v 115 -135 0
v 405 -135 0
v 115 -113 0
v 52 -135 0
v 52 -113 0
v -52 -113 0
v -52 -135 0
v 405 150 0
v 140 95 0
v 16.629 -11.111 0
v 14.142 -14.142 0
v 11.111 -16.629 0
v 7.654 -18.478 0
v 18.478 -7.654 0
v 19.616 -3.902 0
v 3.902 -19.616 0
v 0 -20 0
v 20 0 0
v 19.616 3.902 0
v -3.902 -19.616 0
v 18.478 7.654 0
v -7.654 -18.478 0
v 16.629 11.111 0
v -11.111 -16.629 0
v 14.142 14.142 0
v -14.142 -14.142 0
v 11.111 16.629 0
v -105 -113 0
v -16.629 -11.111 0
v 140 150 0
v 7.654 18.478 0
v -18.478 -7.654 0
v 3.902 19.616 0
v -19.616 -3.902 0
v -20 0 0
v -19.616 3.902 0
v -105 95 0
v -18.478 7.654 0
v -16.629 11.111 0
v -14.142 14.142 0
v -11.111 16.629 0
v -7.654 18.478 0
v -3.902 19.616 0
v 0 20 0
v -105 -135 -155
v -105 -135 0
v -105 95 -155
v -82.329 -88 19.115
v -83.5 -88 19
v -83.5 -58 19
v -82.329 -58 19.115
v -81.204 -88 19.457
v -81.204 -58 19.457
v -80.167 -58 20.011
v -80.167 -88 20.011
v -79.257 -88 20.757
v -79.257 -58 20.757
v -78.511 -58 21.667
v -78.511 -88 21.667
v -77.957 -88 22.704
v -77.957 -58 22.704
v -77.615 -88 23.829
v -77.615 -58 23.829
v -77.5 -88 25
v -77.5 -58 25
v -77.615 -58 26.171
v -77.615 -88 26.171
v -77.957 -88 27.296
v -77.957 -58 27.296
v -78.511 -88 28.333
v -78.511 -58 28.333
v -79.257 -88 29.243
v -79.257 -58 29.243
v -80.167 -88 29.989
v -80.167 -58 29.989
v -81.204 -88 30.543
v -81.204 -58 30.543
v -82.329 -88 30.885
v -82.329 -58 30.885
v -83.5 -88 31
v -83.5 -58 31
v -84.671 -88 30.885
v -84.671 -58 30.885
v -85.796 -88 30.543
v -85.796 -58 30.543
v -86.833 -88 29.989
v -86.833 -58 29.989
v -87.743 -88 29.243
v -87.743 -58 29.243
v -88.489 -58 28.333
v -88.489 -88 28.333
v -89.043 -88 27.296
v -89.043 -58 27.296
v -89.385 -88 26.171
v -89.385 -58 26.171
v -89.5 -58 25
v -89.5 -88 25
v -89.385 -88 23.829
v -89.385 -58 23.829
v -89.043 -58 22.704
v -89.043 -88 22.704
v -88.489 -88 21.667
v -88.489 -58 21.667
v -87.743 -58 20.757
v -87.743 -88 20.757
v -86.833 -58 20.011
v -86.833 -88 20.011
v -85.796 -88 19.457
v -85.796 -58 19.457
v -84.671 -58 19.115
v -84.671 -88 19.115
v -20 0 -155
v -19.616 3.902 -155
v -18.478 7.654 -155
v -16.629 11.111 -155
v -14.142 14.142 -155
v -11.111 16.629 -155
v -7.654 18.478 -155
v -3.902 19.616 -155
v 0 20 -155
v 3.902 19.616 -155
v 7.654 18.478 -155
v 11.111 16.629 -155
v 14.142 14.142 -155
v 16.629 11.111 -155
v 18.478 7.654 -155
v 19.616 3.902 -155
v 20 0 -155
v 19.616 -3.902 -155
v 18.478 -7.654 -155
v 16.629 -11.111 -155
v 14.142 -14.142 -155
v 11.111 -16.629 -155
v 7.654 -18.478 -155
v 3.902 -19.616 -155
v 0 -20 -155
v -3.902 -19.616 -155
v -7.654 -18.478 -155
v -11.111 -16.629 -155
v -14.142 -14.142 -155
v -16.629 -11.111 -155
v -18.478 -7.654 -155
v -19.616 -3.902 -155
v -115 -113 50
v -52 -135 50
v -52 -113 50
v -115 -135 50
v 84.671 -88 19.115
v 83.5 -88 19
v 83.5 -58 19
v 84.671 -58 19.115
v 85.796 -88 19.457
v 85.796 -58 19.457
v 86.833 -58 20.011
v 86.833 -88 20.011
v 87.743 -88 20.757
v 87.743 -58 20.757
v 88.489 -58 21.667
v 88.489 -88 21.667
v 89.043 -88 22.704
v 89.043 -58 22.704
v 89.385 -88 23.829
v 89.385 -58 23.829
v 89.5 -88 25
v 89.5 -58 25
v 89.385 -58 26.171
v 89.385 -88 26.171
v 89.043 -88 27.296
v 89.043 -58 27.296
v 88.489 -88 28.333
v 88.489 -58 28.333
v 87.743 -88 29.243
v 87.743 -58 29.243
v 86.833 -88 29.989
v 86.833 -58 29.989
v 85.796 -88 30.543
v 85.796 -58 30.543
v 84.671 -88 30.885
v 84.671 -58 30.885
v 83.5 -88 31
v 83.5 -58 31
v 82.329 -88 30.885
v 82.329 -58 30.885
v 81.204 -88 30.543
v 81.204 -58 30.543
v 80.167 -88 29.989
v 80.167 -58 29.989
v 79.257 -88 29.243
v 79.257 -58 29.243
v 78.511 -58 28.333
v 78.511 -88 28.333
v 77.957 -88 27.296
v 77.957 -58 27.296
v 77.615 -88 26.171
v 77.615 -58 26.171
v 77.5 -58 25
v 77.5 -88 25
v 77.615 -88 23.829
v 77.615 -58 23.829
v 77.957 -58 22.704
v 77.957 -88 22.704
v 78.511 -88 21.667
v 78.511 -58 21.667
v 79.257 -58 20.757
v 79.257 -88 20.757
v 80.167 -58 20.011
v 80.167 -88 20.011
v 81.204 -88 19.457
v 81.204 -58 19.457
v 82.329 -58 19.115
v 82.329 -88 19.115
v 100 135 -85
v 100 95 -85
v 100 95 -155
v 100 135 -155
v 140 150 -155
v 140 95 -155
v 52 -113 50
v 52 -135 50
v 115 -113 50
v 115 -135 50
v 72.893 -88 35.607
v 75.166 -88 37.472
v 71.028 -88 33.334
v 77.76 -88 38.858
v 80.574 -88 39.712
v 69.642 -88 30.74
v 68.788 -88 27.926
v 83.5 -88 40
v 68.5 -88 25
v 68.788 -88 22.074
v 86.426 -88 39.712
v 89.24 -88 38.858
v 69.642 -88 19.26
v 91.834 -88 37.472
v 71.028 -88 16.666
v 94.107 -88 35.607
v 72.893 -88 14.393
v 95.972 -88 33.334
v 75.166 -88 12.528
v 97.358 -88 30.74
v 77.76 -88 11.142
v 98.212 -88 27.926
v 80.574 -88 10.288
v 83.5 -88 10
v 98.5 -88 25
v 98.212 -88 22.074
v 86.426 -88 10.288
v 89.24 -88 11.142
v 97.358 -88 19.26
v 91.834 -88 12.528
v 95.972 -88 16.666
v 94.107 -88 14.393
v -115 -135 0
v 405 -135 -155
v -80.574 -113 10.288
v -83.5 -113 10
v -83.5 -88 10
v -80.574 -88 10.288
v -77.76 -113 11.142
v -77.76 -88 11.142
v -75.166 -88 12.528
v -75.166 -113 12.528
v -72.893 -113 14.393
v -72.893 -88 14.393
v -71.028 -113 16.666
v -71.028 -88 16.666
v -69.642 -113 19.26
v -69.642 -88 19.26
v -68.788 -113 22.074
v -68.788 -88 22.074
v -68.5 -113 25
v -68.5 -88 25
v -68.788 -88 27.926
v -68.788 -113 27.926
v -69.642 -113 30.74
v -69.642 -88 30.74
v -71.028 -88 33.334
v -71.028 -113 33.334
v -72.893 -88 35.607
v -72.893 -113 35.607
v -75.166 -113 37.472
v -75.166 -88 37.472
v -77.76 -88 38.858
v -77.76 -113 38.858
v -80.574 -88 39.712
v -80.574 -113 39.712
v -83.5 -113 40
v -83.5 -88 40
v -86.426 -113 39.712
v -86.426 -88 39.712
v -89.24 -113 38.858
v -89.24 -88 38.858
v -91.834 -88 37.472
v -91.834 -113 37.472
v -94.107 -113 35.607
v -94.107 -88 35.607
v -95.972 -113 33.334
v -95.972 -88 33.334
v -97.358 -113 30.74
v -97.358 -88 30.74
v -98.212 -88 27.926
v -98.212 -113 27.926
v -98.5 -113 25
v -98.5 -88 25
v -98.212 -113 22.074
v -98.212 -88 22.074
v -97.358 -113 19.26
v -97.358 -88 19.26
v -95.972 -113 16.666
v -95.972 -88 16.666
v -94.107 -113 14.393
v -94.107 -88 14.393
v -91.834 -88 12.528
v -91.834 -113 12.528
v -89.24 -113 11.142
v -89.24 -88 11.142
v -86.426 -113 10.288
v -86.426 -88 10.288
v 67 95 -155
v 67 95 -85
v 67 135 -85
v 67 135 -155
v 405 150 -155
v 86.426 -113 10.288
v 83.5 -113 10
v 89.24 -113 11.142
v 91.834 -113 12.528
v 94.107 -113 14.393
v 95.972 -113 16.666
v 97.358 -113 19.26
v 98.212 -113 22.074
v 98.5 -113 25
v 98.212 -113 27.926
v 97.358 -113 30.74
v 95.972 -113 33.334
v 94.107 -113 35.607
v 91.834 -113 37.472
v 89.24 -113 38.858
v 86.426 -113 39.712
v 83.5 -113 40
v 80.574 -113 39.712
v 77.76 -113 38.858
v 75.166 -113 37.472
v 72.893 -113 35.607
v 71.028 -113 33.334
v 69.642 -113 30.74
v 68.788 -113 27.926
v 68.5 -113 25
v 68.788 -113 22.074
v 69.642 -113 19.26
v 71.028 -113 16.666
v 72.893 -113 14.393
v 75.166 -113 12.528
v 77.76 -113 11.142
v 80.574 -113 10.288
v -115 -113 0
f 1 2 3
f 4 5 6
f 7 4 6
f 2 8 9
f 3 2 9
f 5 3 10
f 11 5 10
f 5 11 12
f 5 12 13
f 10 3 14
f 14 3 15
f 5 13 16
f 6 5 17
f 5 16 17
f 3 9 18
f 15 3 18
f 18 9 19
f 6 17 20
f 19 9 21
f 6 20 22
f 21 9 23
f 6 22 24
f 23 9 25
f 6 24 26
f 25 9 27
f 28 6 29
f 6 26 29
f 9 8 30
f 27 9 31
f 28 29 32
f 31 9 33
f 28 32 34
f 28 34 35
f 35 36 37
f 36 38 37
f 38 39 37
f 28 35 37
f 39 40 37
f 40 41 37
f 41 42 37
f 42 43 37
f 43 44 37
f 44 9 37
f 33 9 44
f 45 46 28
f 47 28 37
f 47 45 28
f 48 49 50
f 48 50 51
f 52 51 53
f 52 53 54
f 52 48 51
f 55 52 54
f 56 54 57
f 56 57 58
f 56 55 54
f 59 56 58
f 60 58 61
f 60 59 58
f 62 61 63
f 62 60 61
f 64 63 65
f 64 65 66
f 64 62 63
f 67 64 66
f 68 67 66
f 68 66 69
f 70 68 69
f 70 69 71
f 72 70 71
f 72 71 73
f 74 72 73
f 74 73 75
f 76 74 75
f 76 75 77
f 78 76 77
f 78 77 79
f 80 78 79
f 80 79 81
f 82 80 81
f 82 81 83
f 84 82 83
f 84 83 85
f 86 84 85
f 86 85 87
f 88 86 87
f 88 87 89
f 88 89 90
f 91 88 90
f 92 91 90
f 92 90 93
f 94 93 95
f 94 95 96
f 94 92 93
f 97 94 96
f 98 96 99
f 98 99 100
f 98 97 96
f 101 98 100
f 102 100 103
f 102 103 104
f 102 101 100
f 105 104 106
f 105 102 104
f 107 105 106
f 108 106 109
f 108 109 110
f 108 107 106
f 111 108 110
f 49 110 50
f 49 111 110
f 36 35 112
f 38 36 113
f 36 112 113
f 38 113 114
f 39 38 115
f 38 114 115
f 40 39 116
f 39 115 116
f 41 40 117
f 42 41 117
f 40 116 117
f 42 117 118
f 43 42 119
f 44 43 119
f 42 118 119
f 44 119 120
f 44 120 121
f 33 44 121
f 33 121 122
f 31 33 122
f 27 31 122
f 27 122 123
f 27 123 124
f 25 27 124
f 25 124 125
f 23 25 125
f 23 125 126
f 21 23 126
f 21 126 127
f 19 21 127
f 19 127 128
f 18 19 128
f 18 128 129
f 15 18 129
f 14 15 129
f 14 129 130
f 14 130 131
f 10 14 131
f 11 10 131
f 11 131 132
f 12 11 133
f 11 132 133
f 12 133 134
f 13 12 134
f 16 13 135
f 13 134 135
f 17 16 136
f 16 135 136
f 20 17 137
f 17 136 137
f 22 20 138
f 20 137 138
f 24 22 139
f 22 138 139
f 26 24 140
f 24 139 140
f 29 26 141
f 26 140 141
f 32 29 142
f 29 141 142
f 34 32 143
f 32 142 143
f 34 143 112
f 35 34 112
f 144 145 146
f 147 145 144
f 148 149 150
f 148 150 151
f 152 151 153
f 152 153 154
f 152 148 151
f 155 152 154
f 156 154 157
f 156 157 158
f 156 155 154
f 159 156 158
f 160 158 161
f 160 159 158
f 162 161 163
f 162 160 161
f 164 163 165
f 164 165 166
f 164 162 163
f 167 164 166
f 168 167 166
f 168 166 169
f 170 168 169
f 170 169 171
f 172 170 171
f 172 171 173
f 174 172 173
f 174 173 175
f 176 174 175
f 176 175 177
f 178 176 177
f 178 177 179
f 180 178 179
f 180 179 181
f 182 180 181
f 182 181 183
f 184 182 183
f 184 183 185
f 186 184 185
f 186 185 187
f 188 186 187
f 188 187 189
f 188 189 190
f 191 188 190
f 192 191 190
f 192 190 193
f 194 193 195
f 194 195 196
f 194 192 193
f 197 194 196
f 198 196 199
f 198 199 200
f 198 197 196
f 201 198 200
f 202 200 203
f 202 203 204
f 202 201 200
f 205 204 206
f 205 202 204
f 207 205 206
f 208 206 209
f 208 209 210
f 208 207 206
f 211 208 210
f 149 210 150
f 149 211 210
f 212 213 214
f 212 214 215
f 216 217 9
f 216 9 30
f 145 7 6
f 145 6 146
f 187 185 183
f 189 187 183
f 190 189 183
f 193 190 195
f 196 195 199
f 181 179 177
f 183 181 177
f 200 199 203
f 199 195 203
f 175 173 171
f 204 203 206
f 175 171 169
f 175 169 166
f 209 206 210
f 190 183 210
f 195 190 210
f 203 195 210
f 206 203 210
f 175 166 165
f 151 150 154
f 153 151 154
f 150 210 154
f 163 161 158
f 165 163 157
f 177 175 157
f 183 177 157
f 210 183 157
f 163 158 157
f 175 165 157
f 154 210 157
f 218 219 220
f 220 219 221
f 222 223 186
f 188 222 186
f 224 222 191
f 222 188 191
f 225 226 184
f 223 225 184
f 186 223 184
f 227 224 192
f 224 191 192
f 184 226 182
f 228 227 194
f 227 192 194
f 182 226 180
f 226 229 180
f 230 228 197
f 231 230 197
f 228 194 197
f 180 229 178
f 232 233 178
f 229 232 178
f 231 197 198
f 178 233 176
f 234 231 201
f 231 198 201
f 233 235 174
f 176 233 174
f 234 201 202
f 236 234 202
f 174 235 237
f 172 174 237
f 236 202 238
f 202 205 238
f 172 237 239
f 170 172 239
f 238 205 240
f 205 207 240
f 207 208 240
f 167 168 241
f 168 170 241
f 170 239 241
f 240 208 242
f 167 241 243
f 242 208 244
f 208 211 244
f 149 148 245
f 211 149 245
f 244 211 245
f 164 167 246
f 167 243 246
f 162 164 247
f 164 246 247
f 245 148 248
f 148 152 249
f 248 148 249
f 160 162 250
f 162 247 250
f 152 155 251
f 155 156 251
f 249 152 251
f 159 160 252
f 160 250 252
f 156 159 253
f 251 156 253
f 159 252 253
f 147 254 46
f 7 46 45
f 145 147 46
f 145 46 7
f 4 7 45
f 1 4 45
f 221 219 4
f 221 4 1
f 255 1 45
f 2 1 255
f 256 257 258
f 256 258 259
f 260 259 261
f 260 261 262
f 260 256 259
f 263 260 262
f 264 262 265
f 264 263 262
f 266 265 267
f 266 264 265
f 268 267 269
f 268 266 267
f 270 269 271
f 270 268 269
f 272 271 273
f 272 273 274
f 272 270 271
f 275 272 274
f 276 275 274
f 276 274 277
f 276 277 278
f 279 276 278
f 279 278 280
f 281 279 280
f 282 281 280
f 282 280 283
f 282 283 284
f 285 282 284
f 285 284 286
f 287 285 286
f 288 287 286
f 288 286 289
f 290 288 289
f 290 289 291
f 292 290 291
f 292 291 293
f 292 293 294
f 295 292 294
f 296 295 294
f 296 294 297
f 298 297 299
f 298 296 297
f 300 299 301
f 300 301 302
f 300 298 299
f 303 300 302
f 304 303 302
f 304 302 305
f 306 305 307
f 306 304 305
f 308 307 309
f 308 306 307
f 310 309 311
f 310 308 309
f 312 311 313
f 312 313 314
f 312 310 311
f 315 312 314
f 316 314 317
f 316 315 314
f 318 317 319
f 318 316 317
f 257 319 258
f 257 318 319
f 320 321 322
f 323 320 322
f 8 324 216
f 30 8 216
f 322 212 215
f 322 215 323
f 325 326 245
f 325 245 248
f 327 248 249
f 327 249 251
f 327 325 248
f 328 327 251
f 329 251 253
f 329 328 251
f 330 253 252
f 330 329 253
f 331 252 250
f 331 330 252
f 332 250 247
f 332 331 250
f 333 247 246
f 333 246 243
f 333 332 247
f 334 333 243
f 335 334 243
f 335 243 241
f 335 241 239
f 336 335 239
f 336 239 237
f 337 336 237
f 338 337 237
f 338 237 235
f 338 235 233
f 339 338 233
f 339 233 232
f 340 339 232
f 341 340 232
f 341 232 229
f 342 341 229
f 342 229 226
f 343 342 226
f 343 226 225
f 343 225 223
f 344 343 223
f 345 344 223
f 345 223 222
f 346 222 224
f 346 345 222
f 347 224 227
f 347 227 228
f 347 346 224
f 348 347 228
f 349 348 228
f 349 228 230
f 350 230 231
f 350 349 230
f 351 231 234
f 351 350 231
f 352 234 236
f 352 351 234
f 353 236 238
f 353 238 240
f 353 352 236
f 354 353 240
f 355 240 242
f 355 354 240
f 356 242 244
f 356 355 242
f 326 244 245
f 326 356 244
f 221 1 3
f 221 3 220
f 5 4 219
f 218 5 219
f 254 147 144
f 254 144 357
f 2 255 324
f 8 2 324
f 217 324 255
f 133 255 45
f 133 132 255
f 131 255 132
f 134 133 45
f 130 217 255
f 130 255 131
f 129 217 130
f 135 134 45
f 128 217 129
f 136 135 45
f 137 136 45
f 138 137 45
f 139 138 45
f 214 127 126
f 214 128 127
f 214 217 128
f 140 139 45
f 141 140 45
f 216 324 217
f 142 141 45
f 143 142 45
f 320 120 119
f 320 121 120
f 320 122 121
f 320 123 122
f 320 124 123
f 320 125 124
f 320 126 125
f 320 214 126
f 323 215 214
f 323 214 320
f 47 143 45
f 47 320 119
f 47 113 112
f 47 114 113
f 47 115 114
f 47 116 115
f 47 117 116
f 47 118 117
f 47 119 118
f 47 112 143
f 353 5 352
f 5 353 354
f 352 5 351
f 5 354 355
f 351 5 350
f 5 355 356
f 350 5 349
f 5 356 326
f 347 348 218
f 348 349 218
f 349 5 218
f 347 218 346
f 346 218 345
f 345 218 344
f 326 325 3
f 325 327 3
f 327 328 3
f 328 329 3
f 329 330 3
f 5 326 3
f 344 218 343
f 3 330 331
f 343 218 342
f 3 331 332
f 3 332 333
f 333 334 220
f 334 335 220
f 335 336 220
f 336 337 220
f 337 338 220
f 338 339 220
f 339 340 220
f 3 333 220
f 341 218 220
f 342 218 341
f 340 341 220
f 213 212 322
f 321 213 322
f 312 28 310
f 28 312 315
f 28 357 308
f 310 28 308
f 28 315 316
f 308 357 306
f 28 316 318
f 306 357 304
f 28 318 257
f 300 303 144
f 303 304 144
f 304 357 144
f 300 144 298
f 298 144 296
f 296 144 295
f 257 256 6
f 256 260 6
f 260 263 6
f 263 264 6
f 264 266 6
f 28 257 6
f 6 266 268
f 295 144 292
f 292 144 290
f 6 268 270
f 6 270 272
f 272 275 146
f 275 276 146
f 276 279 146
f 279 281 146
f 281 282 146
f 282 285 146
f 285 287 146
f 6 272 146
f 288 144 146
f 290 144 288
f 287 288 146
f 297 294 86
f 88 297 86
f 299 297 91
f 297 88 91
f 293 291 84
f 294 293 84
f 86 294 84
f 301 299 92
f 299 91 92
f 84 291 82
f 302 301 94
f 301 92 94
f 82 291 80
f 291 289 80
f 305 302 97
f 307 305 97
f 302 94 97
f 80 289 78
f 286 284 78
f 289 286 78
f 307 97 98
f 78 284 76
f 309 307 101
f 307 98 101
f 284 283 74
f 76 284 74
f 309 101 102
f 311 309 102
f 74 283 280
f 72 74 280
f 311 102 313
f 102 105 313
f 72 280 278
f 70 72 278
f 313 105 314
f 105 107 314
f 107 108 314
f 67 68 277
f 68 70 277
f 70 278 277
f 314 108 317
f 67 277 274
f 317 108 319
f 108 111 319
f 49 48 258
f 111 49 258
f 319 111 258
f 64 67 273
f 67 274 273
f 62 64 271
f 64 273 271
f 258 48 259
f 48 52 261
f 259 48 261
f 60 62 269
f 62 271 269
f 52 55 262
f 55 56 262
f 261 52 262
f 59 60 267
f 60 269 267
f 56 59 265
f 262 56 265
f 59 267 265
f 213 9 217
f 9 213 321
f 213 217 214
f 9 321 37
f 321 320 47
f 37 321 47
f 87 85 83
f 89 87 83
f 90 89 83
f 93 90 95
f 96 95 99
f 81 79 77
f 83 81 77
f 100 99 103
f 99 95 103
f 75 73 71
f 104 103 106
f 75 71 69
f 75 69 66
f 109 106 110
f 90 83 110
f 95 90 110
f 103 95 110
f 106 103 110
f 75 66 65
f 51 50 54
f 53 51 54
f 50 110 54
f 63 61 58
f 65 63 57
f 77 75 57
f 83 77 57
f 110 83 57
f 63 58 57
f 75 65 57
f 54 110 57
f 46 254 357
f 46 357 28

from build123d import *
from build123d.topology import SkipClean

# Parameters (mm, degrees)
SKETCH2_R           = 85
SKETCH2_R_2         = 20
BOSS_EXTRUDE1_DEPTH = 5
BOSS_EXTRUDE2_START = 155
SKETCH3_W           = 245
SKETCH3_H           = 230
SKETCH3_R           = 85
SKETCH3_W_2         = 265
SKETCH3_H_2         = 285
SKETCH3_R_2         = 20
BOSS_EXTRUDE2_DEPTH = 155
SKETCH4_W           = 33
SKETCH4_H           = 40
BOSS_EXTRUDE4_DEPTH = 70
SKETCH6_R           = 15
SKETCH6_W           = 63
SKETCH6_H           = 50
BOSS_EXTRUDE6_DEPTH = 22
SKETCH6_3_R         = 15
SKETCH6_3_R_2       = 6
BOSS_EXTRUDE7_DEPTH = 47
SKETCH6_4_R         = 6
BOSS_EXTRUDE8_DEPTH = 77
SKETCH2_4_R         = 85
CUT_EXTRUDE2_DEPTH  = 5


with BuildPart() as part:
    # Sketch2 → Boss-Extrude1 (new body)
    with BuildSketch(Plane.XY):
        Circle(SKETCH2_R)
        Circle(SKETCH2_R_2, mode=Mode.SUBTRACT)
    extrude(amount=BOSS_EXTRUDE1_DEPTH)

    # Sketch3 → Boss-Extrude2 (add)
    # profile 1 of 3: a face of its own
    with SkipClean():  # the faces are left unmerged after this step: merging them gives an invalid solid
        with BuildSketch(Plane(origin=(0, 0, 0), x_dir=(-1, 0, 0), z_dir=(0, 0, -1)).offset(BOSS_EXTRUDE2_START)):
            with Locations((-17.5, -20)):
                Rectangle(SKETCH3_W, SKETCH3_H)
            with Locations(Location((0, 0, 0), (0, 0, 180))):
                Circle(SKETCH3_R, mode=Mode.SUBTRACT)
        # profile 2 of 3: a face of its own
        with BuildSketch(Plane(origin=(0, 0, 0), x_dir=(-1, 0, 0), z_dir=(0, 0, -1)).offset(BOSS_EXTRUDE2_START)):
            with Locations((-272.5, 7.5)):
                Rectangle(SKETCH3_W_2, SKETCH3_H_2)
        # profile 3 of 3: a face of its own
        with BuildSketch(Plane(origin=(0, 0, 0), x_dir=(-1, 0, 0), z_dir=(0, 0, -1)).offset(BOSS_EXTRUDE2_START)):
            with Locations(Location((0, 0, 0), (0, 0, 180))):
                Circle(SKETCH3_R)
            Circle(SKETCH3_R_2, mode=Mode.SUBTRACT)
        extrude(amount=-BOSS_EXTRUDE2_DEPTH)

    # Sketch4 → Boss-Extrude4 (add)
    with SkipClean():  # the faces are left unmerged after this step: merging them gives an invalid solid
        with BuildSketch(Plane(origin=(0, 0, -155), x_dir=(-1, 0, 0), z_dir=(0, 0, -1))):
            with Locations((-83.5, 115)):
                Rectangle(SKETCH4_W, SKETCH4_H)
        extrude(amount=-BOSS_EXTRUDE4_DEPTH)

    # Sketch6 → Boss-Extrude6 (add)
    # profile 1 of 2: a face of its own
    with SkipClean():  # the faces are left unmerged after this step: merging them gives an invalid solid
        with BuildSketch(Plane.XZ.offset(135)):
            Polygon((-115, 50), (-115, 0), (-105, 0), (-52, 0), (-52, 50), align=None)
            with Locations(Location((-83.5, 25, 0), (0, 0, 270))):
                Circle(SKETCH6_R, mode=Mode.SUBTRACT)
        # profile 2 of 2: a face of its own
        with BuildSketch(Plane.XZ.offset(135)):
            with Locations((83.5, 25)):
                Rectangle(SKETCH6_W, SKETCH6_H)
            with Locations(Location((83.5, 25, 0), (0, 0, 270))):
                Circle(SKETCH6_R, mode=Mode.SUBTRACT)
        extrude(amount=-BOSS_EXTRUDE6_DEPTH)

    # Sketch6<3> → Boss-Extrude7 (add)
    # profile 1 of 2: a face of its own
    with SkipClean():  # the faces are left unmerged after this step: merging them gives an invalid solid
        with BuildSketch(Plane.XZ.offset(135)):
            with Locations(Location((-83.5, 25, 0), (0, 0, 270))):
                Circle(SKETCH6_3_R)
            with Locations(Location((-83.5, 25, 0), (0, 0, 270))):
                Circle(SKETCH6_3_R_2, mode=Mode.SUBTRACT)
        # profile 2 of 2: a face of its own
        with BuildSketch(Plane.XZ.offset(135)):
            with Locations(Location((83.5, 25, 0), (0, 0, 270))):
                Circle(SKETCH6_3_R)
            with Locations(Location((83.5, 25, 0), (0, 0, 270))):
                Circle(SKETCH6_3_R_2, mode=Mode.SUBTRACT)
        extrude(amount=-BOSS_EXTRUDE7_DEPTH)

    # Sketch6<4> → Boss-Extrude8 (add)
    with SkipClean():  # the faces are left unmerged after this step: merging them gives an invalid solid
        with BuildSketch(Plane.XZ.offset(135)):
            with Locations(Location((-83.5, 25, 0), (0, 0, 270))):
                Circle(SKETCH6_4_R)
            with Locations(Location((83.5, 25, 0), (0, 0, 270))):
                Circle(SKETCH6_4_R)
        extrude(amount=-BOSS_EXTRUDE8_DEPTH)

    # Sketch2<4> → Cut-Extrude2 (cut)
    with BuildSketch(Plane.XY):
        Circle(SKETCH2_4_R)
    extrude(amount=CUT_EXTRUDE2_DEPTH, mode=Mode.SUBTRACT)


solid = part.part
